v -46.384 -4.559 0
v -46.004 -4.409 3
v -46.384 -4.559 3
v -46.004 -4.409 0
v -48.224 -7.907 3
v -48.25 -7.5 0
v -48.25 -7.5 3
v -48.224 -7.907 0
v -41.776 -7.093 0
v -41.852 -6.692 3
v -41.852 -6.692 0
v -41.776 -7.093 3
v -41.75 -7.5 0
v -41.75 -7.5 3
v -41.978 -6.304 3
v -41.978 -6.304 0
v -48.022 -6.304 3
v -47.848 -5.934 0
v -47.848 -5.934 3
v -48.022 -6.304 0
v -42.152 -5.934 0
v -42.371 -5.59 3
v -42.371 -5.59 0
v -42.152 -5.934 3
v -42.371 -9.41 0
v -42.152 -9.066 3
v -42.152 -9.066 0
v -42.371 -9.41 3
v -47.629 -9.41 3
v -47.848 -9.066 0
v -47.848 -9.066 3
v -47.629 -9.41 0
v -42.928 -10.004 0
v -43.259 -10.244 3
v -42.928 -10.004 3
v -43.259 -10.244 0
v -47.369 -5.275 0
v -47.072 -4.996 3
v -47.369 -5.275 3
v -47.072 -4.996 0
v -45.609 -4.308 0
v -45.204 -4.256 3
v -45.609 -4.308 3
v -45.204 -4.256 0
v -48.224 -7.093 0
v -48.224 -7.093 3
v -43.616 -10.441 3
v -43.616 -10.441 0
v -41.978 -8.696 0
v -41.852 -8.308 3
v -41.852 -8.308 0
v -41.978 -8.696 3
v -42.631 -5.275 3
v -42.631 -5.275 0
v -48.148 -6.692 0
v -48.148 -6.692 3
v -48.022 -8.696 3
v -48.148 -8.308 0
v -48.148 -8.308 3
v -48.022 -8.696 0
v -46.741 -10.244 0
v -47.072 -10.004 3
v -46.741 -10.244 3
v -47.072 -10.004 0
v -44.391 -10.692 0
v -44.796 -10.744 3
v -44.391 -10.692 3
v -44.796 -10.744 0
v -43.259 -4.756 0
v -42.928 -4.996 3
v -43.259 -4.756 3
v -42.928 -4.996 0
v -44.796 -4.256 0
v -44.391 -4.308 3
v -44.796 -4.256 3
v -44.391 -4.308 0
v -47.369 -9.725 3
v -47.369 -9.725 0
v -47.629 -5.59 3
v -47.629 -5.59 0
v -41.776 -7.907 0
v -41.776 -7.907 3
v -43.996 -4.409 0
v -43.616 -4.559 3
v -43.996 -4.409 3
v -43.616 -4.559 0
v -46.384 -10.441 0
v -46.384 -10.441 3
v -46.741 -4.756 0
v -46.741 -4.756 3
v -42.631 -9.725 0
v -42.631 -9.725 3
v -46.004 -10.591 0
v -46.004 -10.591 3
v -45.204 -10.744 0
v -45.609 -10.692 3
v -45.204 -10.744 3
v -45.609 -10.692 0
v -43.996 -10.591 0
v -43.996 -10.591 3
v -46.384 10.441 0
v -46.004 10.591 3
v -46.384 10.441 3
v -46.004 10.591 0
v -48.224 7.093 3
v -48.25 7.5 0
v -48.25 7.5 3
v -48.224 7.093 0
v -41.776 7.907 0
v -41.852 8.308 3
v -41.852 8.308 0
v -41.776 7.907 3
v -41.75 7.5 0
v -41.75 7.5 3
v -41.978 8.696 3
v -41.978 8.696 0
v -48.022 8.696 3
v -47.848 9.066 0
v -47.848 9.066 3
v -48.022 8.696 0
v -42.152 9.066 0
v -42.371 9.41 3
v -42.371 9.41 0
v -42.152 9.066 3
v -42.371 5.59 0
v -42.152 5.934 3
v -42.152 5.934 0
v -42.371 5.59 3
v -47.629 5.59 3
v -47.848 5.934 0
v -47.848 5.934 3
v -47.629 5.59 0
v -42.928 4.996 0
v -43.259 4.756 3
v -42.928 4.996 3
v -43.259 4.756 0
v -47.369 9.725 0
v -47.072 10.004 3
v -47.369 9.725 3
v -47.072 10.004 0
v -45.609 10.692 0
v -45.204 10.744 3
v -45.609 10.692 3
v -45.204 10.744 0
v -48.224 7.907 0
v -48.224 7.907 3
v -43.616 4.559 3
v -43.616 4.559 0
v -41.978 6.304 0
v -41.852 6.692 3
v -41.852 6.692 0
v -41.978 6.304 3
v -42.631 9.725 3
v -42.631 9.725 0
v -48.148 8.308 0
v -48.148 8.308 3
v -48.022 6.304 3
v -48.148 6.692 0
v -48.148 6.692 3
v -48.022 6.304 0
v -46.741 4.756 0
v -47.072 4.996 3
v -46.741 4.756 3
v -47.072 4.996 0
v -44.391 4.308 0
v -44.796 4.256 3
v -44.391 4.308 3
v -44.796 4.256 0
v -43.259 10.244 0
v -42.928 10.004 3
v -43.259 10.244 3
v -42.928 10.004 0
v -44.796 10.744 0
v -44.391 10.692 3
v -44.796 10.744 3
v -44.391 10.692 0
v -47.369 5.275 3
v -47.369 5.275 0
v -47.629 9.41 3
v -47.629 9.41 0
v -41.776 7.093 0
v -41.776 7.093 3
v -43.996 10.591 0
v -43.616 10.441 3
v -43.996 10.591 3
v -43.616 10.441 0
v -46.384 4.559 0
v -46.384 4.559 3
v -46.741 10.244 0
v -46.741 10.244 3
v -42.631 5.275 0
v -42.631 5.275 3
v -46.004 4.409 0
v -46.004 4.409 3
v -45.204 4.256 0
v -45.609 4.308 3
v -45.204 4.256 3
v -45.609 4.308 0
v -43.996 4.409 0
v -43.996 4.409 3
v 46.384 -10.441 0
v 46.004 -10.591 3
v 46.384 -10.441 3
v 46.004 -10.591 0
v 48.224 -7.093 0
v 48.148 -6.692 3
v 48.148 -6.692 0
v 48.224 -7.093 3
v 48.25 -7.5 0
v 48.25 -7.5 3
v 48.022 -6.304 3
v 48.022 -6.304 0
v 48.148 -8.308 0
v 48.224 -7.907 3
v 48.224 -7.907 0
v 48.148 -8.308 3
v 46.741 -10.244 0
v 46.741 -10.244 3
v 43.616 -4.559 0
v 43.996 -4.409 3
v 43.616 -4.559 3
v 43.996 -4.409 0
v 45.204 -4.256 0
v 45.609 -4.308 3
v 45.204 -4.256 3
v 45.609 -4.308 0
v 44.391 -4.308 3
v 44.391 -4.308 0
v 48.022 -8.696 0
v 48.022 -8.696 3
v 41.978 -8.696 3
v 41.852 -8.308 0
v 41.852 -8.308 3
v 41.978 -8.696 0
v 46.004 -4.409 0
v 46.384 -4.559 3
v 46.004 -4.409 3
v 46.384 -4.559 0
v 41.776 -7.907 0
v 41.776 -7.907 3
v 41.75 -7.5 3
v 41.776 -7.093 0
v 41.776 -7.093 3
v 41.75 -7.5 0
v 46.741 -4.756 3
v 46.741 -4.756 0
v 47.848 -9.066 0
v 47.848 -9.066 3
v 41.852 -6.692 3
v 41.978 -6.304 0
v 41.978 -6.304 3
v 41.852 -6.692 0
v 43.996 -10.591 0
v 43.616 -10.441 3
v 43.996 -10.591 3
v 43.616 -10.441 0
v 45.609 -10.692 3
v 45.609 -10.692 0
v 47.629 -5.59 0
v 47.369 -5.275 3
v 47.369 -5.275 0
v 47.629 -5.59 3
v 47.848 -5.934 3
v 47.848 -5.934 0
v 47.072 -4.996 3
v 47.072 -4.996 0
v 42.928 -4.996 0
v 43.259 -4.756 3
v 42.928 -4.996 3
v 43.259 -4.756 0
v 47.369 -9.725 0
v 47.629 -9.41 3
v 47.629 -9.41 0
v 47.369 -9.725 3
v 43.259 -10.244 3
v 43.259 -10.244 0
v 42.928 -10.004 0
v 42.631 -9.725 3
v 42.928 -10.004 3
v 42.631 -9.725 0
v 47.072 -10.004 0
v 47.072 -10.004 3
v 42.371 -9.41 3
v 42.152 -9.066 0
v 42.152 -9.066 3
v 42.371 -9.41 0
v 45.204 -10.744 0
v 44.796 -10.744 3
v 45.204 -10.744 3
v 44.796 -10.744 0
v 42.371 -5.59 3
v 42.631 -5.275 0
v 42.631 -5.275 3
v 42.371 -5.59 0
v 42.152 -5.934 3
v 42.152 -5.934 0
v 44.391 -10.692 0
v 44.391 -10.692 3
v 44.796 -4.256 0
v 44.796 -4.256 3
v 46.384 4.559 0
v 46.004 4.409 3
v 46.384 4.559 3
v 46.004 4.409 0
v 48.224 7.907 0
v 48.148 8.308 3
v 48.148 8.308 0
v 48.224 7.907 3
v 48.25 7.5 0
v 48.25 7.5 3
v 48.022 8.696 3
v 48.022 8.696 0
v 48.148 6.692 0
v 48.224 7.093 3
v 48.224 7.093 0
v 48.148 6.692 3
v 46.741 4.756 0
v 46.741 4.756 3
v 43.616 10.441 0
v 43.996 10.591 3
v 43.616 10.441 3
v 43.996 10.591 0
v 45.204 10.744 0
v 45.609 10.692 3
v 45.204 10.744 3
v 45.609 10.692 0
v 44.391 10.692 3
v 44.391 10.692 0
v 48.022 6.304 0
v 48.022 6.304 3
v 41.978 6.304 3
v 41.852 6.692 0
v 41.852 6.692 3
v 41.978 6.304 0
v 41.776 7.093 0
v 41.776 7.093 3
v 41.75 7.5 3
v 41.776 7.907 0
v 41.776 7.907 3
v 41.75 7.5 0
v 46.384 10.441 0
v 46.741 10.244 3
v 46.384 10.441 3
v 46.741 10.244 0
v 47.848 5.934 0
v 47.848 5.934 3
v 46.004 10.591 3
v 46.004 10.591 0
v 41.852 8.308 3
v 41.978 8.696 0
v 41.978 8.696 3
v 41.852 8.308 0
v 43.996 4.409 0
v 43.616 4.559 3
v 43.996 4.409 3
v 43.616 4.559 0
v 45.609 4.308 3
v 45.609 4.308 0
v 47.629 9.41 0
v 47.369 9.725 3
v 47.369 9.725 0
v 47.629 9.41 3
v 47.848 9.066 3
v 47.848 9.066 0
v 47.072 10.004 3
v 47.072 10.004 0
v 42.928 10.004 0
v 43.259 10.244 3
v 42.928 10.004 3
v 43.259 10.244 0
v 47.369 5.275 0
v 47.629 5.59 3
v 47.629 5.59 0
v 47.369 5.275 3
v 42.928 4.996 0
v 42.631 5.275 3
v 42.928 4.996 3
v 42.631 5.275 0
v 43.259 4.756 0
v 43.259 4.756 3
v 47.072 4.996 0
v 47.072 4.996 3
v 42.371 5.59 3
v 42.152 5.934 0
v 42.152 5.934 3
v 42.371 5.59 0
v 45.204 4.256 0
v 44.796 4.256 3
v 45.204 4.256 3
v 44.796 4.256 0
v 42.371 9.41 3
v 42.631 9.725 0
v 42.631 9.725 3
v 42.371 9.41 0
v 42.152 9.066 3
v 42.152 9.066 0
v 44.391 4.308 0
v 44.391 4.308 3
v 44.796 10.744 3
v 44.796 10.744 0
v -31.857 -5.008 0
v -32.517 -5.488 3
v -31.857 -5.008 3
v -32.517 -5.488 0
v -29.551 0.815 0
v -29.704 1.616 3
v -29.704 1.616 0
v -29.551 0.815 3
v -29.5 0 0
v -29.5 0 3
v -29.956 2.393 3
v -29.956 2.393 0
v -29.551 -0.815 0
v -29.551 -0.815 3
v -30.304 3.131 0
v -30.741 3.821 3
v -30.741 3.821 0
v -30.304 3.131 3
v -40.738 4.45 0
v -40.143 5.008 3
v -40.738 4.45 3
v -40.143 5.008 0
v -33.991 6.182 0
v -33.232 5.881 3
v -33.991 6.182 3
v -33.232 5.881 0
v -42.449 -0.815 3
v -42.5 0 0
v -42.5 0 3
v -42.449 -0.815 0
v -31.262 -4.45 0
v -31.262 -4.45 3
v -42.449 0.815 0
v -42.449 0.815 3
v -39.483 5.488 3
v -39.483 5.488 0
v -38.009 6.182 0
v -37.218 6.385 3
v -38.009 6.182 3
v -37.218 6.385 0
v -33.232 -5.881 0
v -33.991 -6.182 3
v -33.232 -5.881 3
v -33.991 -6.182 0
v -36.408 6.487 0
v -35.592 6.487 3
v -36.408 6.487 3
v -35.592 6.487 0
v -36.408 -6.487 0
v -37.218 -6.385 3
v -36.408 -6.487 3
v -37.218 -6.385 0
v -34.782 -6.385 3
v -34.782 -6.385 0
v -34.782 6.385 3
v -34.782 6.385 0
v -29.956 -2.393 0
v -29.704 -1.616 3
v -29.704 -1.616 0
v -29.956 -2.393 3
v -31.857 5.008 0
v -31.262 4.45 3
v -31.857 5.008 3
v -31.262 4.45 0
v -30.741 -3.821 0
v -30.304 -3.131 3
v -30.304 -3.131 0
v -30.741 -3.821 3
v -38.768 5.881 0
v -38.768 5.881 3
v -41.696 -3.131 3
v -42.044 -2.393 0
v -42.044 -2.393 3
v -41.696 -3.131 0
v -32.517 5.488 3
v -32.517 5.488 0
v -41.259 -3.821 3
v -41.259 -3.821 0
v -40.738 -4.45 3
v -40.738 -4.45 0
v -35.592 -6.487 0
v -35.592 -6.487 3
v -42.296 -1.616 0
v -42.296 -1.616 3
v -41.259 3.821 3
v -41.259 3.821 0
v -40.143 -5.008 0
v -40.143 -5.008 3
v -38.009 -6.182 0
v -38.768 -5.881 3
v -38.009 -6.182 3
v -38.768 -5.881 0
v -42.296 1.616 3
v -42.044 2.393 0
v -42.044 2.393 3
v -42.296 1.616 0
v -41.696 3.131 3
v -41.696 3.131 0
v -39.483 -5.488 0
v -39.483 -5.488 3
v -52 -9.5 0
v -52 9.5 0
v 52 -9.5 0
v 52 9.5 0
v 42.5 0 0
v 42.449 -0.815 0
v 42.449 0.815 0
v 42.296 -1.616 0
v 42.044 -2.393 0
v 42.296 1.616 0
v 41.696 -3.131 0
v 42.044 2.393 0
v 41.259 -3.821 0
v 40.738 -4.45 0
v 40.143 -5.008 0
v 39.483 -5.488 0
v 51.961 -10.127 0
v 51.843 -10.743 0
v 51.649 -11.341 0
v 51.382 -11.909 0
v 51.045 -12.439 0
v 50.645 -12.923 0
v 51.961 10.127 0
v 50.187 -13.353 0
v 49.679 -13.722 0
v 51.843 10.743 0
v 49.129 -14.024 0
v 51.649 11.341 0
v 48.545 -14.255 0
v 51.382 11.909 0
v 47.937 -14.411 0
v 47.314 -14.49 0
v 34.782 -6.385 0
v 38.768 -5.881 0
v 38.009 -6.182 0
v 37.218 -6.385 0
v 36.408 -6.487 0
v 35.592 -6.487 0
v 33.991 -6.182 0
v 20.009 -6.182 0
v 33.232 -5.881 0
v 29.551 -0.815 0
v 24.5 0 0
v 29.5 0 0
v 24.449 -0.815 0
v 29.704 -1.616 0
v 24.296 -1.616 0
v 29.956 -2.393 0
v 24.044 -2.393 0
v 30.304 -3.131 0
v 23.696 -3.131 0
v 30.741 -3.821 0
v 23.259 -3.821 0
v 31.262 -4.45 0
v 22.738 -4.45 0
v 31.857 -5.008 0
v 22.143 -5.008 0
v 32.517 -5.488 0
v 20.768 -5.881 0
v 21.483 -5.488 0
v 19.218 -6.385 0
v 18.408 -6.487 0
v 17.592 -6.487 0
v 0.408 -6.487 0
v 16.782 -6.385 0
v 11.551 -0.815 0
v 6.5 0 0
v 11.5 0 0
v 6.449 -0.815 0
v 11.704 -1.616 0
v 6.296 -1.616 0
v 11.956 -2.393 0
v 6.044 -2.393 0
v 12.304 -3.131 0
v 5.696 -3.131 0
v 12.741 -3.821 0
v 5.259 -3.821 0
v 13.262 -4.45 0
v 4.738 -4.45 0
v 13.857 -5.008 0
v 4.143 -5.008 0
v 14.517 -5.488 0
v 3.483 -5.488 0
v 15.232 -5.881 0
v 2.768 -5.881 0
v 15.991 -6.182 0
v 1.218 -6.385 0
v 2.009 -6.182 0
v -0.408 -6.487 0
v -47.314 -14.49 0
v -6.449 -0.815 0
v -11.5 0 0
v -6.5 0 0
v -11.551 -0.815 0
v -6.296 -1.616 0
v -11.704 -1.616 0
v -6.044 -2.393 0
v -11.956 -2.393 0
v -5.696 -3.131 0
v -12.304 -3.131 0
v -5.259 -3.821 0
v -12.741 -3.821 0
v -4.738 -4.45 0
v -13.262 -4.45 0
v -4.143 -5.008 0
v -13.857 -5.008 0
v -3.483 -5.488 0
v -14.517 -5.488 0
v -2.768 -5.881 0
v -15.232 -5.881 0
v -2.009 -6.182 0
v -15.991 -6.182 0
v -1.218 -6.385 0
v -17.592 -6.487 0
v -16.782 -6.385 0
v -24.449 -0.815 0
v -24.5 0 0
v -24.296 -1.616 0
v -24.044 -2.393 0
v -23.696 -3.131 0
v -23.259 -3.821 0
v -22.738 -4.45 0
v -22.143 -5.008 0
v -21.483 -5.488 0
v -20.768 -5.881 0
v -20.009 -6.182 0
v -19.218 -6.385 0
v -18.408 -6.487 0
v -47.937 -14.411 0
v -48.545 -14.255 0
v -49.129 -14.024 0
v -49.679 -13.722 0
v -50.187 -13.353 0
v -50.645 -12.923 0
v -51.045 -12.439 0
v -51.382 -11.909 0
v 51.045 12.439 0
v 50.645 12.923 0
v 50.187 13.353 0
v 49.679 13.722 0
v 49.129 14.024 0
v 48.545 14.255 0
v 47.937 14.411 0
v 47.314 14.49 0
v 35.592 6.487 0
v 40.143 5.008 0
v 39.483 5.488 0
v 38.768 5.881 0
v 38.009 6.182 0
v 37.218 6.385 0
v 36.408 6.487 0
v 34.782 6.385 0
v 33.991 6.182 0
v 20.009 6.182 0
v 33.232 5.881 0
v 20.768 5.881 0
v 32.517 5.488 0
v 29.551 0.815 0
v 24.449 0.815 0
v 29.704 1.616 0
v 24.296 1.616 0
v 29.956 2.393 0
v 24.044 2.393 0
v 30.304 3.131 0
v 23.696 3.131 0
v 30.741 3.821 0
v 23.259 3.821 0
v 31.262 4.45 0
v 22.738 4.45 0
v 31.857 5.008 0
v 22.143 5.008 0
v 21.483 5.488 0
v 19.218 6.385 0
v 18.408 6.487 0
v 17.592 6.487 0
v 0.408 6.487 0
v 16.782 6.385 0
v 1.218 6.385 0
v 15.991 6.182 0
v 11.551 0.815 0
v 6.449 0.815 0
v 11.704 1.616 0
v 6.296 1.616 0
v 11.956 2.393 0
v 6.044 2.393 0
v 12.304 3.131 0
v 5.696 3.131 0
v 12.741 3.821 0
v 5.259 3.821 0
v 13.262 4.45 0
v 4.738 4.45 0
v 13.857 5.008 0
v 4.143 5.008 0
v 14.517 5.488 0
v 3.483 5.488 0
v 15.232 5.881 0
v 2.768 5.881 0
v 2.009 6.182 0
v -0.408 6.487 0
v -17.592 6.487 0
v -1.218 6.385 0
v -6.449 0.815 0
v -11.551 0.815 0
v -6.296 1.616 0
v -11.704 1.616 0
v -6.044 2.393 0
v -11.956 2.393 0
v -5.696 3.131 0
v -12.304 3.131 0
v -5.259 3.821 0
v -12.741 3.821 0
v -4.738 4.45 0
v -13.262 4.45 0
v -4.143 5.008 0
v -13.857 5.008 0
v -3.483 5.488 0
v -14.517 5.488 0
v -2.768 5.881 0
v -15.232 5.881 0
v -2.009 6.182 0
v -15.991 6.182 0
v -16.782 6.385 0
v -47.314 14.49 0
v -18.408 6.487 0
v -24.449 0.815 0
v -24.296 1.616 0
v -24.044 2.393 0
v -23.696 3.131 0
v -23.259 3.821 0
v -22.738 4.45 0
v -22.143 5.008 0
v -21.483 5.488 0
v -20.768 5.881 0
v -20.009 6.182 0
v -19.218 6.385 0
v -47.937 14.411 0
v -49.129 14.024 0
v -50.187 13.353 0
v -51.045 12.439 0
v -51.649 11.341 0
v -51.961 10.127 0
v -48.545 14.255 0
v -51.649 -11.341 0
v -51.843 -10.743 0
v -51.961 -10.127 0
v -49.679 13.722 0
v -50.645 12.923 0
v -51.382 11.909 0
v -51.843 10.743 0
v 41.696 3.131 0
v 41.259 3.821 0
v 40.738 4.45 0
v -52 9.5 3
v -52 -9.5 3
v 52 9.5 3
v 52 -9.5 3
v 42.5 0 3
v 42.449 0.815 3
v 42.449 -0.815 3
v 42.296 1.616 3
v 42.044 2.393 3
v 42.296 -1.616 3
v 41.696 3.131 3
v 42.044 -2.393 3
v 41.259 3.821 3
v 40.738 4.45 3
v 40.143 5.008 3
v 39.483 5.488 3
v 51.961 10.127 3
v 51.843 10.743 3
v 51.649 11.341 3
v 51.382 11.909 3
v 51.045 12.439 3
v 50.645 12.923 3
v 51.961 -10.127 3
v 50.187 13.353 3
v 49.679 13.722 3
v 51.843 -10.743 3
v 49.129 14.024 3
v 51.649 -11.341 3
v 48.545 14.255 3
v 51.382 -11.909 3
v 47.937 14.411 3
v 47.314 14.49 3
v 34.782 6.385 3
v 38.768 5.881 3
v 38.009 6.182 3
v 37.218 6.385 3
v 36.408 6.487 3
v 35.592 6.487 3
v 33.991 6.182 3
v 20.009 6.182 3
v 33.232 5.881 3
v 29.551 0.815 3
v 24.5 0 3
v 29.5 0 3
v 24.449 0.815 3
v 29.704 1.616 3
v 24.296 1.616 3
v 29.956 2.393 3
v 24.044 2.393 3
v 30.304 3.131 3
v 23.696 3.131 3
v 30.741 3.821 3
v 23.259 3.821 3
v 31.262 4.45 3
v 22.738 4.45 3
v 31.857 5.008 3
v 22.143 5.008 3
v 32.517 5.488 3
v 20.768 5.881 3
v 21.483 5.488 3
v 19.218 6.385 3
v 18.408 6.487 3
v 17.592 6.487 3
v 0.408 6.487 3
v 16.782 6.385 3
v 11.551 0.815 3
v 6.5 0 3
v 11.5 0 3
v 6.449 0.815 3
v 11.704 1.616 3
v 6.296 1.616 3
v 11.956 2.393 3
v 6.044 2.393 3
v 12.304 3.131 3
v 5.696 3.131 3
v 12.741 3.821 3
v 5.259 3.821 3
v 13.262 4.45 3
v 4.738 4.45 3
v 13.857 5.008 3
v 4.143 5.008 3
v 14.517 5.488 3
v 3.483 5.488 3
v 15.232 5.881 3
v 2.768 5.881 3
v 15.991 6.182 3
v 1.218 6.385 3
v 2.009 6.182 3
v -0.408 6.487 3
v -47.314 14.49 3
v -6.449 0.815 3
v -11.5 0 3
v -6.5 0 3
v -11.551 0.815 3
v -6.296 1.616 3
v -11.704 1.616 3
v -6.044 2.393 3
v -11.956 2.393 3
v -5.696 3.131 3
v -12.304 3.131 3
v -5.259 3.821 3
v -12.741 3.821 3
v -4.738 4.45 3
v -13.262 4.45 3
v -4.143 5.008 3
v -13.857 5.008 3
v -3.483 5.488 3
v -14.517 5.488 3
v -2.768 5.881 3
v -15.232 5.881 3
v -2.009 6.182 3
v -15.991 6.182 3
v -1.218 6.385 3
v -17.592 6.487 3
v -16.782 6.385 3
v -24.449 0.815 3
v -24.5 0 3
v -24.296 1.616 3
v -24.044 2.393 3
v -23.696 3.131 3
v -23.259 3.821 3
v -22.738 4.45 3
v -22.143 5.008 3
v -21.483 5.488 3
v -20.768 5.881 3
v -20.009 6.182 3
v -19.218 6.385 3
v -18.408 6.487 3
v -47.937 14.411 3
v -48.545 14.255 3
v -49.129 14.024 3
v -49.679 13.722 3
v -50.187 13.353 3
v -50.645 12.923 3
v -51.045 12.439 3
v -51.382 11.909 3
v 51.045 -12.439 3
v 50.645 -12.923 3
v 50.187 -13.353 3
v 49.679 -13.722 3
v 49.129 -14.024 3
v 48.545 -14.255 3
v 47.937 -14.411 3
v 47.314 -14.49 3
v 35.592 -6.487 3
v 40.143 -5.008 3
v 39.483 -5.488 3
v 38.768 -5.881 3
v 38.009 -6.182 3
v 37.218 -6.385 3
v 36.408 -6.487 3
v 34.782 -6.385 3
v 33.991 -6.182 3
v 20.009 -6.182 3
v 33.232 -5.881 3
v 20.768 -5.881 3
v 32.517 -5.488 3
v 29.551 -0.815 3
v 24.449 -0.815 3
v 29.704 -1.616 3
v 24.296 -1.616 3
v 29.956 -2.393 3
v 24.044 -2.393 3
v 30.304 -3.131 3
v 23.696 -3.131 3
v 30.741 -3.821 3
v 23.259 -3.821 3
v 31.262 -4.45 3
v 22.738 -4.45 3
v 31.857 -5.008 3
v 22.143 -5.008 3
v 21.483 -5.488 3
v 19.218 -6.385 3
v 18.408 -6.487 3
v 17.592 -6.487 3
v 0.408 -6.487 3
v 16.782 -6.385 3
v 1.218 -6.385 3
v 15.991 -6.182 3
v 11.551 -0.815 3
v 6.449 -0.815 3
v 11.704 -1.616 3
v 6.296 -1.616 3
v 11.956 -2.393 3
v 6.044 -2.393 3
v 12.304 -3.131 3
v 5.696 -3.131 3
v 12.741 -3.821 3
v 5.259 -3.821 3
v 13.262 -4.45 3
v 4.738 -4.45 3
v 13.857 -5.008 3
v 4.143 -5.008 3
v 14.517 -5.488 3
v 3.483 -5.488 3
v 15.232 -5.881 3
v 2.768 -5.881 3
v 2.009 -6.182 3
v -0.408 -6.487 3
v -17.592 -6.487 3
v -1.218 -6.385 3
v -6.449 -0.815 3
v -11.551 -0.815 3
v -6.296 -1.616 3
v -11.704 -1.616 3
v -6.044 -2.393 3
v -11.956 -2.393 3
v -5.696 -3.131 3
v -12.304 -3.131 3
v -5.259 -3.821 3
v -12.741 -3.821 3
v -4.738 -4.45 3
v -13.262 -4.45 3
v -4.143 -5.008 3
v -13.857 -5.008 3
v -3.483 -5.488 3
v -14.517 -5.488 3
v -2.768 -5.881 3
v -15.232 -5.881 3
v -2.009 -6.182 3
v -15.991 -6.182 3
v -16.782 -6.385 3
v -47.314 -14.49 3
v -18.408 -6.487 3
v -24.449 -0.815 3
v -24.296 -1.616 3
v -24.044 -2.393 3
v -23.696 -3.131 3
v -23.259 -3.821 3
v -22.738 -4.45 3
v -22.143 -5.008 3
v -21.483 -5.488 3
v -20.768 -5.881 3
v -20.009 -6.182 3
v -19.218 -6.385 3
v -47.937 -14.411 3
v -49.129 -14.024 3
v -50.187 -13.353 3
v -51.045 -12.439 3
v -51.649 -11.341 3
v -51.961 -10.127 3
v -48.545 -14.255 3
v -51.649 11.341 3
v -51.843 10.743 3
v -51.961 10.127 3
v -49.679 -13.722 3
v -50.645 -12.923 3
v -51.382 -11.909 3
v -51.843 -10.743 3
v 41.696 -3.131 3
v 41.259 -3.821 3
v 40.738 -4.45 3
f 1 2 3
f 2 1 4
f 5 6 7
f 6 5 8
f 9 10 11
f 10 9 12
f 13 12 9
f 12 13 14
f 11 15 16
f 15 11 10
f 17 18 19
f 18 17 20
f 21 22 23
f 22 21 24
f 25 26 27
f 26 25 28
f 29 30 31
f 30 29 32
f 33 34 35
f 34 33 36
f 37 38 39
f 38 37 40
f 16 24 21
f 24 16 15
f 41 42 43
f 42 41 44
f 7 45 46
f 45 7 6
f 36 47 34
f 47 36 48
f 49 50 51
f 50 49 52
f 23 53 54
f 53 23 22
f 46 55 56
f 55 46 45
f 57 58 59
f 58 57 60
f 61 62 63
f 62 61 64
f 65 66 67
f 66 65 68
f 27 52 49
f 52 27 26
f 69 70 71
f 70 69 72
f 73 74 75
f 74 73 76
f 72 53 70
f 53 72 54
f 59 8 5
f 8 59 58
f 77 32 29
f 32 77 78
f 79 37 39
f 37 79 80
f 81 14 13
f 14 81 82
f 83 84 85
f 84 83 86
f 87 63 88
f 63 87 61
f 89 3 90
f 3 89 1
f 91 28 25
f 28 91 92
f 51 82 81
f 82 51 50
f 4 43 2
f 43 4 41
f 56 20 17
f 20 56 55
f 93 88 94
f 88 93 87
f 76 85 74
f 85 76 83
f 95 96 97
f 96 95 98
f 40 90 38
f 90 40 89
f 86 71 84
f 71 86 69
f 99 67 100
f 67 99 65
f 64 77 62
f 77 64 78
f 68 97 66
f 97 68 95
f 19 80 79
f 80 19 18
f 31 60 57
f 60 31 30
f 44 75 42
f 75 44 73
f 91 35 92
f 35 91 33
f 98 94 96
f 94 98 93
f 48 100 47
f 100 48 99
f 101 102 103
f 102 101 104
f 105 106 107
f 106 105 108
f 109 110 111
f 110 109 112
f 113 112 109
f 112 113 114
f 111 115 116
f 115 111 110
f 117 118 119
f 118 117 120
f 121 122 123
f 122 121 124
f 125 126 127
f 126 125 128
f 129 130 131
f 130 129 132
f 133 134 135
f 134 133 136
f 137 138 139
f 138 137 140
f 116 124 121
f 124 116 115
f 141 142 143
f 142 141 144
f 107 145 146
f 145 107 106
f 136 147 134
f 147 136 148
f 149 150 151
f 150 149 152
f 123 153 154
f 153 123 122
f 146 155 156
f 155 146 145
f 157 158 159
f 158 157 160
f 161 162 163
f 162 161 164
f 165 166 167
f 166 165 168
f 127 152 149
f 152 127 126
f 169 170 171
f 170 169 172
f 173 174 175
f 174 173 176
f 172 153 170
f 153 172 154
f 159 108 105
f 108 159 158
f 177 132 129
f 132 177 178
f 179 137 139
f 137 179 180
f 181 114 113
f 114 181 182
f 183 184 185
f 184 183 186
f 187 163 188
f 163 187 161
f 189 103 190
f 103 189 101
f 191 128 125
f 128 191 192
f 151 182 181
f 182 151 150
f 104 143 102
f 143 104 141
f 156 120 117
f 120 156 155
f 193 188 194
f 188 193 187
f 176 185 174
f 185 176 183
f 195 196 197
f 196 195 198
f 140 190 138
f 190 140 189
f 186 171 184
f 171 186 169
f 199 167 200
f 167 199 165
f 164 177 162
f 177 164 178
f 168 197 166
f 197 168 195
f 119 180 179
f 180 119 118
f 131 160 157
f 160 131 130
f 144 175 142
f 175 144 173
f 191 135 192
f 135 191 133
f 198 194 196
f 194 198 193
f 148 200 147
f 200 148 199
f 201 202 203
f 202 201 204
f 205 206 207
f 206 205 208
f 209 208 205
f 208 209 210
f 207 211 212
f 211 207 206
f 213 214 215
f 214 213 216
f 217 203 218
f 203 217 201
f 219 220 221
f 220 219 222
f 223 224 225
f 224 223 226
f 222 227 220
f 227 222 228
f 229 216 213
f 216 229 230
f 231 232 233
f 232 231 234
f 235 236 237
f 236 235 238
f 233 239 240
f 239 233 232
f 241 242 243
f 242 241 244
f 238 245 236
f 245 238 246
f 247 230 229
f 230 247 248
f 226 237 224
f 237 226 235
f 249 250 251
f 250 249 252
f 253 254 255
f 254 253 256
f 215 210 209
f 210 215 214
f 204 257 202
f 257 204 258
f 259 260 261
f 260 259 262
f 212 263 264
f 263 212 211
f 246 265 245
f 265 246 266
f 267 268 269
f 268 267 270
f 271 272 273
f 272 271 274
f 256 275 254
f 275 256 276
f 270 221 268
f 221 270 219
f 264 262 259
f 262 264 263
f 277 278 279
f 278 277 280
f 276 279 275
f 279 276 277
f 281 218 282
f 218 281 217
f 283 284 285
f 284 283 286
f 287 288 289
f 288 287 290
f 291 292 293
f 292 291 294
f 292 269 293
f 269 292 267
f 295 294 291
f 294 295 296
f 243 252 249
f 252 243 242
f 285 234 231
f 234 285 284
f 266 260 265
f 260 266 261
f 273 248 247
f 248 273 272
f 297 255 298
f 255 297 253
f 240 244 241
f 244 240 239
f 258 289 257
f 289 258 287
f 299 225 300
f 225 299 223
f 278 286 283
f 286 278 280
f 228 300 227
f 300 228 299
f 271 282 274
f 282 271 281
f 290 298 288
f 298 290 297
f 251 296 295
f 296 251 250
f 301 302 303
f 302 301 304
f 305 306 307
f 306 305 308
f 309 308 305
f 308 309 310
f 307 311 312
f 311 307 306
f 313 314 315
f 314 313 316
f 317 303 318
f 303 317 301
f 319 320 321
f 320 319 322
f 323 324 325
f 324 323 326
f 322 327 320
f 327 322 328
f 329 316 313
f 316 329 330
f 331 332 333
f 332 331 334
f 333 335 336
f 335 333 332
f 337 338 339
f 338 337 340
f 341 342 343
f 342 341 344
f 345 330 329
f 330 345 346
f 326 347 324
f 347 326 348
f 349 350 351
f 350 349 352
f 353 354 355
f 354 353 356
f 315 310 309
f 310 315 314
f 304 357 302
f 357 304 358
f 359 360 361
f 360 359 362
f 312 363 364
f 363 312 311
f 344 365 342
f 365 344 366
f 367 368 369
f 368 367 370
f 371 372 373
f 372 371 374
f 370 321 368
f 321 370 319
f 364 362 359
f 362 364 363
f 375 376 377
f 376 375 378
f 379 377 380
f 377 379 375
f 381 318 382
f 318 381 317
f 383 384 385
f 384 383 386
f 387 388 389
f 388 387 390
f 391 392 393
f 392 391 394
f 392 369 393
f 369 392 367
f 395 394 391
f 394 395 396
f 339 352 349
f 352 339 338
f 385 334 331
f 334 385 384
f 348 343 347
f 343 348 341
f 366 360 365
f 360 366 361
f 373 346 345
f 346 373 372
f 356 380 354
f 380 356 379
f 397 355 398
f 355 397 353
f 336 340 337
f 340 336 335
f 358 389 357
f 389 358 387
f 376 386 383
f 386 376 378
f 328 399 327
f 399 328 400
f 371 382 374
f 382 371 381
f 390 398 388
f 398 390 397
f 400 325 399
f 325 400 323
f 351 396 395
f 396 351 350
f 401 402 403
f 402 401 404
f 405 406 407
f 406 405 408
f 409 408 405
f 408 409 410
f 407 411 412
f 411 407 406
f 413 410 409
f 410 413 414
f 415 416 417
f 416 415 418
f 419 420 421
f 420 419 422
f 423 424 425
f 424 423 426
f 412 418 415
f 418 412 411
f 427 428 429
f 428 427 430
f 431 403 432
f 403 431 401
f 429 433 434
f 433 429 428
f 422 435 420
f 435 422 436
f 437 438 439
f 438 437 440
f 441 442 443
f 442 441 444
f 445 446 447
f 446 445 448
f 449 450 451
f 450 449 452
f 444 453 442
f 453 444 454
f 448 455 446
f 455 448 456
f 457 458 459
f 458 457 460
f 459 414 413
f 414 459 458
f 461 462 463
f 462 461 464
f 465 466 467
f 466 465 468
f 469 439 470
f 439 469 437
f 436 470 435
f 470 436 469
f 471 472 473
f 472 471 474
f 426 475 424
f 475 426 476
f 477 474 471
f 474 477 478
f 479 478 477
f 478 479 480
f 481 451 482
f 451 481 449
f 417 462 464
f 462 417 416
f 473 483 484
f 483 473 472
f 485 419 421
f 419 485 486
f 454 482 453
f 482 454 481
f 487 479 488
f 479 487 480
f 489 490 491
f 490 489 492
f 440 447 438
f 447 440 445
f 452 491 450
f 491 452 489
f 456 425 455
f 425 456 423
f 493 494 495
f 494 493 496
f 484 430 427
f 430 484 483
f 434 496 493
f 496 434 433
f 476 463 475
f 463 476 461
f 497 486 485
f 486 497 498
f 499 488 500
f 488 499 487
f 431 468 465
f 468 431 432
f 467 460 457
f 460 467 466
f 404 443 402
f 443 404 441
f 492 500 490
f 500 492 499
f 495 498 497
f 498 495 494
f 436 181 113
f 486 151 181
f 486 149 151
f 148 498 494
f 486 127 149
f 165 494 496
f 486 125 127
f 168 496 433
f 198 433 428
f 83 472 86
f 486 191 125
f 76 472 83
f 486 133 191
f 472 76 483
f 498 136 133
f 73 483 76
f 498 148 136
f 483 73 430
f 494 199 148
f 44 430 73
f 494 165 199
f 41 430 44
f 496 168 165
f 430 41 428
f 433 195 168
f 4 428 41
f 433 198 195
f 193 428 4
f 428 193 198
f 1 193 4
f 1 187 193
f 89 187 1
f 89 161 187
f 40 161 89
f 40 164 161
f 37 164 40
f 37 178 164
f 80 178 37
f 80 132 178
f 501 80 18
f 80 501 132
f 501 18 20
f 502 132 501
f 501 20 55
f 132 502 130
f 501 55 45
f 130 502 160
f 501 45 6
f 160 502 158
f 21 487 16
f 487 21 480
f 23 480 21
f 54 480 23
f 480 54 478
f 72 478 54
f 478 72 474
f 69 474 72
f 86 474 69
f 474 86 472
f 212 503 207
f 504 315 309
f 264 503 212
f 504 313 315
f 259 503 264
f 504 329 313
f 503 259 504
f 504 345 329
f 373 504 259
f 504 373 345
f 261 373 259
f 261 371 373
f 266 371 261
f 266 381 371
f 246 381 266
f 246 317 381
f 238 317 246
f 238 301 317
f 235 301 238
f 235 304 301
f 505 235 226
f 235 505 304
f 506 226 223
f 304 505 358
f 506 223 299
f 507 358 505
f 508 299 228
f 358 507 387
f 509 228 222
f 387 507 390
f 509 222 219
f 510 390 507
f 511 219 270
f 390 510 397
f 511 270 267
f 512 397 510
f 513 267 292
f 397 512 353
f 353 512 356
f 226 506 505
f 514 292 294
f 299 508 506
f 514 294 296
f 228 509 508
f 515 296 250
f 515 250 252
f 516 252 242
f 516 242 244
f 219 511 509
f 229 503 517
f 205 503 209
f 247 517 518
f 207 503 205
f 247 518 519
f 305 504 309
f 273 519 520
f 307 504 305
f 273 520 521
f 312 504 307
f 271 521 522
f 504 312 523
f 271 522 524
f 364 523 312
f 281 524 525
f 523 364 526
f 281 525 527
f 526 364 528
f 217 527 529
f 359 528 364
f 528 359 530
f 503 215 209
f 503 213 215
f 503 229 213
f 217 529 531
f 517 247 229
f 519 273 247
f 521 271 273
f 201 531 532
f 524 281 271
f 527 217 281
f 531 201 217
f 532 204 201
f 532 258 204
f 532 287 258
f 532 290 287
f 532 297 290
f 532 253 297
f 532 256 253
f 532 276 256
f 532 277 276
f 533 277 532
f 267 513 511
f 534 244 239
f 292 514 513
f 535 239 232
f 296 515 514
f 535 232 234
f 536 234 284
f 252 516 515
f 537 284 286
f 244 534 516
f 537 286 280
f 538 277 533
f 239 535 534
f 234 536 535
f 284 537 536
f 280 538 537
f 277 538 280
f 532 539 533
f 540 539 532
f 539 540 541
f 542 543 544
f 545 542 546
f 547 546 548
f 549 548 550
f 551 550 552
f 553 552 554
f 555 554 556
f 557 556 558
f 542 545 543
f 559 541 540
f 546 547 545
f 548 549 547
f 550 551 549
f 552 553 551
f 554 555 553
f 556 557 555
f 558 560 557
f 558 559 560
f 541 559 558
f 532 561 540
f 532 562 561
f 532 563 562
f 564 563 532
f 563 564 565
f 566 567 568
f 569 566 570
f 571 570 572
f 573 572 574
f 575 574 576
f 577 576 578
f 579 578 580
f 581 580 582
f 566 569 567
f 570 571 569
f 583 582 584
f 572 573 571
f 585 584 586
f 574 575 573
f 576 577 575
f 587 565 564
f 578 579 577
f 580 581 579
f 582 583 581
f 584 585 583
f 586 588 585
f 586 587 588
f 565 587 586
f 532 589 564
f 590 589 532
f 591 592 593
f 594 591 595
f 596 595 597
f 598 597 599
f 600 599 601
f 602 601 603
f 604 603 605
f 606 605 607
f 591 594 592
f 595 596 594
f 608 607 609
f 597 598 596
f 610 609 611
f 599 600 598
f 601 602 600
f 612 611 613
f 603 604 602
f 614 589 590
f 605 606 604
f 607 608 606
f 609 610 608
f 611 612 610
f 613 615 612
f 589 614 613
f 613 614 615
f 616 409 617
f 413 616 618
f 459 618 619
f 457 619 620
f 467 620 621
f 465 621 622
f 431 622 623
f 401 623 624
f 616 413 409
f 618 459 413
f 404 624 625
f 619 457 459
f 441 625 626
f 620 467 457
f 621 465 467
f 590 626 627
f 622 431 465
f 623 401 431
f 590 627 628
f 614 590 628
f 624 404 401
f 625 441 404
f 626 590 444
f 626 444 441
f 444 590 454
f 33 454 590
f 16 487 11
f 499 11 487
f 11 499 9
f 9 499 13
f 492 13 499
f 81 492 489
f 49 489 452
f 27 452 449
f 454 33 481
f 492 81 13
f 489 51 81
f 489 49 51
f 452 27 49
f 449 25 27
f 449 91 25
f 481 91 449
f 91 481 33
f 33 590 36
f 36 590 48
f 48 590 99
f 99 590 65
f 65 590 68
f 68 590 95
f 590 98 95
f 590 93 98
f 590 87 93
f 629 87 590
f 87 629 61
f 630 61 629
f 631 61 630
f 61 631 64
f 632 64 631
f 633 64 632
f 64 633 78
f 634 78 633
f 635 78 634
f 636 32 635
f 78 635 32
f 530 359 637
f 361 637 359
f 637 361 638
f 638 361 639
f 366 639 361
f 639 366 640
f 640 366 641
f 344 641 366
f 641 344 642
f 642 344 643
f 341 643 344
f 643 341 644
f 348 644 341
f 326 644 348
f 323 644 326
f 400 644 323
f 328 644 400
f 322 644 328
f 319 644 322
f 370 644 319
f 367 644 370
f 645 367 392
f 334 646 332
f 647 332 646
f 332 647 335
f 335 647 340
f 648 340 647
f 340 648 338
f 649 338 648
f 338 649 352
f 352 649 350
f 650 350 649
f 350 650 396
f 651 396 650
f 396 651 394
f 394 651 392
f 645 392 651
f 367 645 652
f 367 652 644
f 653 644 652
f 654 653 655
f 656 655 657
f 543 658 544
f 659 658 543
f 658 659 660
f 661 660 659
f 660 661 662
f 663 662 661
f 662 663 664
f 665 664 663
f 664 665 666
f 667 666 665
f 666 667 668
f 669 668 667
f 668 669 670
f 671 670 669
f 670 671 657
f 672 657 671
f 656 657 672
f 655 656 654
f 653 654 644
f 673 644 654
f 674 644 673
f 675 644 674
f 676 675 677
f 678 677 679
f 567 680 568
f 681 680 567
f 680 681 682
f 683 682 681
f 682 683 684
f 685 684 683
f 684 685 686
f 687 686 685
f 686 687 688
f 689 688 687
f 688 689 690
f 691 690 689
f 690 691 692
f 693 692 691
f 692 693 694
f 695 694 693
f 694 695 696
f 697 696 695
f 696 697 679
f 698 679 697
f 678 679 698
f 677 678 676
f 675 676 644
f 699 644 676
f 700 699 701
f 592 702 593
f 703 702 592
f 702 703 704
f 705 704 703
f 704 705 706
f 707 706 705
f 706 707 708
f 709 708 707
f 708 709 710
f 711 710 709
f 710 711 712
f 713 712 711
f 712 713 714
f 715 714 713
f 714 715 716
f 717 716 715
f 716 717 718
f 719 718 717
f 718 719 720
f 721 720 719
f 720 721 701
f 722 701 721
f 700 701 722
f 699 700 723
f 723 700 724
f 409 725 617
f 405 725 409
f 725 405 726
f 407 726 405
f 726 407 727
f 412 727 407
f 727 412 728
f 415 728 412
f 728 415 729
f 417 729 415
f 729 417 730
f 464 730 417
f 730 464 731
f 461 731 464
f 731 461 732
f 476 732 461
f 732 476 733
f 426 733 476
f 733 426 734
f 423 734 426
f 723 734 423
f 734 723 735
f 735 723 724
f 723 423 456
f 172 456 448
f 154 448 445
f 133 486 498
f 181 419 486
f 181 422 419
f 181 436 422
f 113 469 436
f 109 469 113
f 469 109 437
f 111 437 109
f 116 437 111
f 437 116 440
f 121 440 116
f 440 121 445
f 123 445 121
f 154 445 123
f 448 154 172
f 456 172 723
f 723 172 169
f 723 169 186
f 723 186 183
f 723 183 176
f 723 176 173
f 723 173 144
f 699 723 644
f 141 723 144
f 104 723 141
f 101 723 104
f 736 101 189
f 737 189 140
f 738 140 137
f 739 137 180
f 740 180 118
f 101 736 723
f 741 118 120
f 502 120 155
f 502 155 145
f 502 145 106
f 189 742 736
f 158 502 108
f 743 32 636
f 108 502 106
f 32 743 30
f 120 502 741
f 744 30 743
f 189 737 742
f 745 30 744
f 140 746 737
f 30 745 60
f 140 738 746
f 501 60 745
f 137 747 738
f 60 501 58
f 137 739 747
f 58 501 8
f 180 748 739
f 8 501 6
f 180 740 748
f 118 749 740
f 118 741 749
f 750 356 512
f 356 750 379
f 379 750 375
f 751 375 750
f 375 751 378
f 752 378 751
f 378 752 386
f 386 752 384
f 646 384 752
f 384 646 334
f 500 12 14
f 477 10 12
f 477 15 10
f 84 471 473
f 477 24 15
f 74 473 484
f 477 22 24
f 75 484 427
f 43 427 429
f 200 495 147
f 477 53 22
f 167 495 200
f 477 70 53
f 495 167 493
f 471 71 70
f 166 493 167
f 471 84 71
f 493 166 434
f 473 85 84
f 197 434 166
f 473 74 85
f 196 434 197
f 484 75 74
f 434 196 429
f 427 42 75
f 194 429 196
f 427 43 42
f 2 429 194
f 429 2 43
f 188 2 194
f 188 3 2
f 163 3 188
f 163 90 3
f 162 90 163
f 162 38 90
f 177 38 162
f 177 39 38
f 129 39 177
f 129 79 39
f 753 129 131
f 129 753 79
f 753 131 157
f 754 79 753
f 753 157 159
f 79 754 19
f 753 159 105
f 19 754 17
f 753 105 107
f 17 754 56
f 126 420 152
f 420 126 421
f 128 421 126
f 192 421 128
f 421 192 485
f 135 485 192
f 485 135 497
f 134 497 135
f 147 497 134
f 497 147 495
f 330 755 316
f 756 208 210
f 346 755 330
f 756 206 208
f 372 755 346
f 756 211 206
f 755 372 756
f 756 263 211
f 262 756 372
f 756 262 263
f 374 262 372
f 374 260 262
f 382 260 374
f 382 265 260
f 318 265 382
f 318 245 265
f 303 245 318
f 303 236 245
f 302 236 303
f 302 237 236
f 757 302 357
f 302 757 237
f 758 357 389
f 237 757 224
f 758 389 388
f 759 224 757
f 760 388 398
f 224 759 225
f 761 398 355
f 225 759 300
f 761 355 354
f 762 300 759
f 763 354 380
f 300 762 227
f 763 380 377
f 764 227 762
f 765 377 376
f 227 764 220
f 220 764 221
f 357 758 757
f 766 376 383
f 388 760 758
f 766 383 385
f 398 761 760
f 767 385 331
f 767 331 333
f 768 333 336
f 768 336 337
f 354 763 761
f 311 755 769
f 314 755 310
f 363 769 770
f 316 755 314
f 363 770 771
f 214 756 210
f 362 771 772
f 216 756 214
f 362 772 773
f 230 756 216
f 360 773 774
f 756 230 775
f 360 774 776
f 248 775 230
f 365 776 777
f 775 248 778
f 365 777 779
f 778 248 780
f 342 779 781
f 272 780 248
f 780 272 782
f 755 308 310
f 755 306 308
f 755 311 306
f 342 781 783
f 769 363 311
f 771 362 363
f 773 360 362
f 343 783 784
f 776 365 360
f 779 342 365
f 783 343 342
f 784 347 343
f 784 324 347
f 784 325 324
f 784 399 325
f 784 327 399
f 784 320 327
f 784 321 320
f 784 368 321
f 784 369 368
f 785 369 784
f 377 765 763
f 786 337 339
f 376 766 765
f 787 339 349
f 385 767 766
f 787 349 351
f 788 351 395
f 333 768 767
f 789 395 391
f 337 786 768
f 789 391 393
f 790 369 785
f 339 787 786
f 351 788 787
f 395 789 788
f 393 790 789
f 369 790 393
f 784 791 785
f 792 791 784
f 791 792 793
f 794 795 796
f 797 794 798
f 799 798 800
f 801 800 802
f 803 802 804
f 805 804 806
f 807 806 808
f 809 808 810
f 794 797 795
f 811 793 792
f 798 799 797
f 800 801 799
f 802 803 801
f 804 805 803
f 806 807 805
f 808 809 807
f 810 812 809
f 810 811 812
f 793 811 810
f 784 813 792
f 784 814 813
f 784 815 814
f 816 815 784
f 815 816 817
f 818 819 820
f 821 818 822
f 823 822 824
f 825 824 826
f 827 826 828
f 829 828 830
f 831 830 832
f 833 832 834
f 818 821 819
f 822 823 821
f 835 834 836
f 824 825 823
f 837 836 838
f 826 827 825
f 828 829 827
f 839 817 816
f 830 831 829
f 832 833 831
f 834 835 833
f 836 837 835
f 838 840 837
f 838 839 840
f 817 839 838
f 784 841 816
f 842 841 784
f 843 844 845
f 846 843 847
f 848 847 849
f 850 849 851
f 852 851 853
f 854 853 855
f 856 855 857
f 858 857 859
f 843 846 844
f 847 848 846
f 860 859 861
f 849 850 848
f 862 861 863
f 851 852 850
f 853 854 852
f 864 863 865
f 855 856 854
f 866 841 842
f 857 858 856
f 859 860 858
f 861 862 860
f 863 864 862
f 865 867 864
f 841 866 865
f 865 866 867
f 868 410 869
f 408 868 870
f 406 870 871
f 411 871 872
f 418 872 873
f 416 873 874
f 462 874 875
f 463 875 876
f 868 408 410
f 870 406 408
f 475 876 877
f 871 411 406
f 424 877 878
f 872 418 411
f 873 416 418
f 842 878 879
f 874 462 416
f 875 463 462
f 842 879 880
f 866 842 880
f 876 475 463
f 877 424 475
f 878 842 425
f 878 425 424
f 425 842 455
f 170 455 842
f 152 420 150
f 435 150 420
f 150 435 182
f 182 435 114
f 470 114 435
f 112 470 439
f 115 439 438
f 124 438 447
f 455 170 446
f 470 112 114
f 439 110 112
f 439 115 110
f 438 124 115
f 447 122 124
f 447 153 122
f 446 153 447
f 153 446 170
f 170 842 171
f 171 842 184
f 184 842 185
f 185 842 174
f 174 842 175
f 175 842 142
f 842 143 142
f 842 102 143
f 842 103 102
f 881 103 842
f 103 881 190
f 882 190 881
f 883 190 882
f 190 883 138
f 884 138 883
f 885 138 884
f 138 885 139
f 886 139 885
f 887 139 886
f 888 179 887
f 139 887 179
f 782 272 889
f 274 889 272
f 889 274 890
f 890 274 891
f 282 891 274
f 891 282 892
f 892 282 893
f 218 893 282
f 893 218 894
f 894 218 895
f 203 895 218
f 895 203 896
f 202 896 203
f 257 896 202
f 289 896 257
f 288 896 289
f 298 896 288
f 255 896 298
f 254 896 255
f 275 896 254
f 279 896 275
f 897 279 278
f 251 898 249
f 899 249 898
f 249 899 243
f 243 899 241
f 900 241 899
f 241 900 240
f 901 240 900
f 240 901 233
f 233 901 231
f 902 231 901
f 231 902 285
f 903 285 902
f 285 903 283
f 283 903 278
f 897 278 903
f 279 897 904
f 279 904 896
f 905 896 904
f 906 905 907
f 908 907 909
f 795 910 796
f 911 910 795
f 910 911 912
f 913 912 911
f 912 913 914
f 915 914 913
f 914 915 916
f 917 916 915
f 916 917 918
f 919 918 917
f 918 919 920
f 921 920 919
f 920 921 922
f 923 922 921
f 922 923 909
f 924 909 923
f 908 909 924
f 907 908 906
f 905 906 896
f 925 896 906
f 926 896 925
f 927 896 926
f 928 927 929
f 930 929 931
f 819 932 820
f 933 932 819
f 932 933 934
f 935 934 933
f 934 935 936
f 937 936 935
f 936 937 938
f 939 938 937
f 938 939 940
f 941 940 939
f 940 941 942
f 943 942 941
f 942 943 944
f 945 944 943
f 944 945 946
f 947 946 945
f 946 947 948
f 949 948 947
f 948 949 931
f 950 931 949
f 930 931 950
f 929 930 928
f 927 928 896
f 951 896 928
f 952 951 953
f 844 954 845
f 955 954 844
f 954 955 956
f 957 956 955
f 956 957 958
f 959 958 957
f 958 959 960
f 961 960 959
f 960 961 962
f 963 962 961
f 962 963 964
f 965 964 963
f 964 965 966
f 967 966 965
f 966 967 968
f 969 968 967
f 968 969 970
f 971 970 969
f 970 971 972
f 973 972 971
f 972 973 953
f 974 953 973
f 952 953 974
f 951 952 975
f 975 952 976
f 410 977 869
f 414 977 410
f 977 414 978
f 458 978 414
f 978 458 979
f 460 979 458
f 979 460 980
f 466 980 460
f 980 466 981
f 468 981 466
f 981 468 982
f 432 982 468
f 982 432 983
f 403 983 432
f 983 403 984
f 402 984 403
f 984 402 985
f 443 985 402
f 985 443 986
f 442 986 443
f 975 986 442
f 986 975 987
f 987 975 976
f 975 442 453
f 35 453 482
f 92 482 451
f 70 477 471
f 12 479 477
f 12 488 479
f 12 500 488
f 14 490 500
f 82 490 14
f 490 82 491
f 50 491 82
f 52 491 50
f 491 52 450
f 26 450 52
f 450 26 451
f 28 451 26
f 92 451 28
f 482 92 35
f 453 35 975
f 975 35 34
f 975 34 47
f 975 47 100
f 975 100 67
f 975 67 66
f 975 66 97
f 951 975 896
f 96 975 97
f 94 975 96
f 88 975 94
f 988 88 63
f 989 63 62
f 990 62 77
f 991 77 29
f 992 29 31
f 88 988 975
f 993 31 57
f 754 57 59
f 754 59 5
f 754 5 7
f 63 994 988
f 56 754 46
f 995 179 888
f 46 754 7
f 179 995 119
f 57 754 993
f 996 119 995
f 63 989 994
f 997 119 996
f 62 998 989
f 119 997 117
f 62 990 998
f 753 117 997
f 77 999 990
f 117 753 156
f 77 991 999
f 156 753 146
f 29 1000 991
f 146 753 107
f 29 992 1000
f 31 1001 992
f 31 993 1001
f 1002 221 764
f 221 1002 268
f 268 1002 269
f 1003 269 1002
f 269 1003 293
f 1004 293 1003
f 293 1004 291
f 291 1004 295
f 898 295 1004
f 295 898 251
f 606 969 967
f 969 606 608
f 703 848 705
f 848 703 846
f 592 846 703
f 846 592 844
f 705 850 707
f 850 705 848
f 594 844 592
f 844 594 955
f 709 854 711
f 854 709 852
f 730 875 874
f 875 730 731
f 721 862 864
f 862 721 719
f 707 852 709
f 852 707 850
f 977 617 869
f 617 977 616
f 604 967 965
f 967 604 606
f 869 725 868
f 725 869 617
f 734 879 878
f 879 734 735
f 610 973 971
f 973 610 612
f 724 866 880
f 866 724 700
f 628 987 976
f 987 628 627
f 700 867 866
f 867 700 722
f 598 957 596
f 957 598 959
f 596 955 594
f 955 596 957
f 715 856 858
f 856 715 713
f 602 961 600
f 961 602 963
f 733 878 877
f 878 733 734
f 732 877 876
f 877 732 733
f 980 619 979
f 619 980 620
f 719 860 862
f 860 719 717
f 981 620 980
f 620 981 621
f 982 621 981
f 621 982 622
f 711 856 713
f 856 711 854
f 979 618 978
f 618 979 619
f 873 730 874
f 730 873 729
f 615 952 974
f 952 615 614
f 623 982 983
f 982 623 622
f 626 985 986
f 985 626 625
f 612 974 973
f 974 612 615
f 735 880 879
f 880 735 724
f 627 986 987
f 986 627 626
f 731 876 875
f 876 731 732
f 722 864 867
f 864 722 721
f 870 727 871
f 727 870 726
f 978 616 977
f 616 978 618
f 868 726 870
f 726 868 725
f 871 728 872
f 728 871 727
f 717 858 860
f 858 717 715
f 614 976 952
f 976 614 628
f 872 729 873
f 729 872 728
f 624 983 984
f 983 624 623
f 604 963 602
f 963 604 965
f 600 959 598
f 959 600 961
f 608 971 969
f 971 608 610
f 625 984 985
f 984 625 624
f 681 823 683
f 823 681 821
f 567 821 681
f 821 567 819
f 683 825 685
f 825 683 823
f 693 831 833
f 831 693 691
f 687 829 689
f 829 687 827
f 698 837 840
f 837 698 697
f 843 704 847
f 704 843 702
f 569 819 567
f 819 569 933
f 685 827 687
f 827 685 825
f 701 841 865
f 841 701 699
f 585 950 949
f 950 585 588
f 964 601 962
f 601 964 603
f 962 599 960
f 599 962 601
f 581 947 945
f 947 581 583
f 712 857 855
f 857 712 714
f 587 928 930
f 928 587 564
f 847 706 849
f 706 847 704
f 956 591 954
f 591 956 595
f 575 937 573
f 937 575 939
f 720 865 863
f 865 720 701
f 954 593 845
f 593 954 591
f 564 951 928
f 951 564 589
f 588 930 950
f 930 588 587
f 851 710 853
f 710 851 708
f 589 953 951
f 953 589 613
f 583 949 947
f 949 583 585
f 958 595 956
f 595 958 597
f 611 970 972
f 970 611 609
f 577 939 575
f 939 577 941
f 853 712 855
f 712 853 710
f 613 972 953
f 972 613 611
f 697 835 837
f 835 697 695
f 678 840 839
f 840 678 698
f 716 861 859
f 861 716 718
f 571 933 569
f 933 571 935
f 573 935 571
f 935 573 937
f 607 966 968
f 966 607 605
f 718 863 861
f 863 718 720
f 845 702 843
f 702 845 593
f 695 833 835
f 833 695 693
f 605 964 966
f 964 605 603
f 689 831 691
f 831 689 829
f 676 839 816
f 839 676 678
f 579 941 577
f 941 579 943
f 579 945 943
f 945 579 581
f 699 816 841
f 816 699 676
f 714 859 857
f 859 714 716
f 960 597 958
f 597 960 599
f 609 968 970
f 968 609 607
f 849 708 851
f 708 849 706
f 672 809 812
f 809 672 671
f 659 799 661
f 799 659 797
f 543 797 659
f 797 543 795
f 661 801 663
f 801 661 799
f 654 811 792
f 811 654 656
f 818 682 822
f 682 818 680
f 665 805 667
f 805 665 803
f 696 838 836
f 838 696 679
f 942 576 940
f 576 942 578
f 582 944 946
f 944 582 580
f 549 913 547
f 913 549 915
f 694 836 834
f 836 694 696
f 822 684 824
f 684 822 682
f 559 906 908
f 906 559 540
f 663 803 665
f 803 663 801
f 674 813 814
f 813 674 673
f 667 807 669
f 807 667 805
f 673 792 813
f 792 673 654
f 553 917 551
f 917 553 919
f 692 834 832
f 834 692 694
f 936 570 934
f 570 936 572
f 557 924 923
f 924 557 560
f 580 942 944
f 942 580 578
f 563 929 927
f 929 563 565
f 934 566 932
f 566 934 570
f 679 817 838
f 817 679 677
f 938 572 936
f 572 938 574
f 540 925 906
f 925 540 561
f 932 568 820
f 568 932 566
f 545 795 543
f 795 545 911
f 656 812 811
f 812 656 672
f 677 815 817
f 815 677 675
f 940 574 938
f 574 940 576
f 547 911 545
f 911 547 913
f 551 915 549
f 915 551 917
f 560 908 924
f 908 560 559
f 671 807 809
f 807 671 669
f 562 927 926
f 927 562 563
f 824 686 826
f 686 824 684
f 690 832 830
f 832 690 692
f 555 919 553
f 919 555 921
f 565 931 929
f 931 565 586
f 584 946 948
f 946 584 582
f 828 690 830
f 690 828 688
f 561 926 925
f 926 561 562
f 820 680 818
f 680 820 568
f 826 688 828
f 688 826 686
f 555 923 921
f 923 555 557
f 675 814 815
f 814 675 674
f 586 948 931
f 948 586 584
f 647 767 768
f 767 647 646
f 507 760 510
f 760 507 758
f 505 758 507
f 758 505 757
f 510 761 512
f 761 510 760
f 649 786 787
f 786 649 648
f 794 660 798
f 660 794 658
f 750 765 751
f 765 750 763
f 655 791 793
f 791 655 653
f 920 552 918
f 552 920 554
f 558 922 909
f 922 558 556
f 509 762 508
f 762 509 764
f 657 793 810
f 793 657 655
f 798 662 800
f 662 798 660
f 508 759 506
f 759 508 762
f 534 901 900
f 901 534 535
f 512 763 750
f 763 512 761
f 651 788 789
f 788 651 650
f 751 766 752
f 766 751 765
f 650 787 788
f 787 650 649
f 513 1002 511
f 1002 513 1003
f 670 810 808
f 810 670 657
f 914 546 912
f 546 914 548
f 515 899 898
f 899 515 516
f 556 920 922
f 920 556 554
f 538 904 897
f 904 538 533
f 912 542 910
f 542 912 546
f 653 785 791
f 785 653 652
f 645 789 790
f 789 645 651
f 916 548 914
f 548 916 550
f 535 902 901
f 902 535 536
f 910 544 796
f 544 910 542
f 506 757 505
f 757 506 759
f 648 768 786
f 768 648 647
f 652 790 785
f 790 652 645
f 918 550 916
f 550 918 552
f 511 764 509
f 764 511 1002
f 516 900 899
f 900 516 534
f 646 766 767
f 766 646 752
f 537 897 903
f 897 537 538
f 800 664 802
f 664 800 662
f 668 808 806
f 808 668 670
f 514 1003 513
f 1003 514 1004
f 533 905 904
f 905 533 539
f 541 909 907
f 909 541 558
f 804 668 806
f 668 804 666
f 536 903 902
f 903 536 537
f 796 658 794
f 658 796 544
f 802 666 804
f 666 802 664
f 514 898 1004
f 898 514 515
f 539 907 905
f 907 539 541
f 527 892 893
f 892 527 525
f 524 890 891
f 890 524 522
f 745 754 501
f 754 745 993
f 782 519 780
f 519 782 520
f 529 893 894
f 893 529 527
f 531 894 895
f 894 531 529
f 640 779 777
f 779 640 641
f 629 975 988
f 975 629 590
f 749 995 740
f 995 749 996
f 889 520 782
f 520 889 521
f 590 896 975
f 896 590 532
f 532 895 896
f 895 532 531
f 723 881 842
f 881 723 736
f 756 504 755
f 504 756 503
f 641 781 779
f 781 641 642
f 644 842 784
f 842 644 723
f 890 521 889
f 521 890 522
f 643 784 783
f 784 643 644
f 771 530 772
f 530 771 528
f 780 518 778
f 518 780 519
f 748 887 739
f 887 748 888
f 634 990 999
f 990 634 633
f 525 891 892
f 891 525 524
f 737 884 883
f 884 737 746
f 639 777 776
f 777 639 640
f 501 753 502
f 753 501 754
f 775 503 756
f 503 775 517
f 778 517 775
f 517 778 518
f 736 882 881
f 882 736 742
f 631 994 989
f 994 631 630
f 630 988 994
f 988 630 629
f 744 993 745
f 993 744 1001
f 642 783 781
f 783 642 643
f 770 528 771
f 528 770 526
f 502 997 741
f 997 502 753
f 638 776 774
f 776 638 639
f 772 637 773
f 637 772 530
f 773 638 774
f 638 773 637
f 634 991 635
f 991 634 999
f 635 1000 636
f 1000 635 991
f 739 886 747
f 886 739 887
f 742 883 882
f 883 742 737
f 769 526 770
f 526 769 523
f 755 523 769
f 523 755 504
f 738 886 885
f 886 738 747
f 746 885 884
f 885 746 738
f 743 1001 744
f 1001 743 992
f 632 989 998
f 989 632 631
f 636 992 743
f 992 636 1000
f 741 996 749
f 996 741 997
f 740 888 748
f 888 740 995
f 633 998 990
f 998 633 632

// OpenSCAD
$fn = 50;

difference() {
	union() {
		hull() {
			translate(v = [-47.0, 9.5, 0]) {
				cylinder(h = 3, r = 5);
			}
			translate(v = [47.0, 9.5, 0]) {
				cylinder(h = 3, r = 5);
			}
			translate(v = [-47.0, -9.5, 0]) {
				cylinder(h = 3, r = 5);
			}
			translate(v = [47.0, -9.5, 0]) {
				cylinder(h = 3, r = 5);
			}
		}
	}
	union() {
		translate(v = [-45.0, -7.5, -100.0]) {
			cylinder(h = 200, r = 3.25);
		}
		translate(v = [-45.0, 7.5, -100.0]) {
			cylinder(h = 200, r = 3.25);
		}
		translate(v = [45.0, -7.5, -100.0]) {
			cylinder(h = 200, r = 3.25);
		}
		translate(v = [45.0, 7.5, -100.0]) {
			cylinder(h = 200, r = 3.25);
		}
		translate(v = [-45.0, -7.5, -100.0]) {
			cylinder(h = 200, r = 1.8);
		}
		translate(v = [-45.0, 7.5, -100.0]) {
			cylinder(h = 200, r = 1.8);
		}
		translate(v = [45.0, -7.5, -100.0]) {
			cylinder(h = 200, r = 1.8);
		}
		translate(v = [45.0, 7.5, -100.0]) {
			cylinder(h = 200, r = 1.8);
		}
		translate(v = [-36.0, 0, 0.0]) {
			cylinder(h = 3, r = 6.5);
		}
		translate(v = [-18.0, 0, 0.0]) {
			cylinder(h = 3, r = 6.5);
		}
		cylinder(h = 3, r = 6.5);
		translate(v = [18.0, 0, 0.0]) {
			cylinder(h = 3, r = 6.5);
		}
		translate(v = [36.0, 0, 0.0]) {
			cylinder(h = 3, r = 6.5);
		}
	}
}
